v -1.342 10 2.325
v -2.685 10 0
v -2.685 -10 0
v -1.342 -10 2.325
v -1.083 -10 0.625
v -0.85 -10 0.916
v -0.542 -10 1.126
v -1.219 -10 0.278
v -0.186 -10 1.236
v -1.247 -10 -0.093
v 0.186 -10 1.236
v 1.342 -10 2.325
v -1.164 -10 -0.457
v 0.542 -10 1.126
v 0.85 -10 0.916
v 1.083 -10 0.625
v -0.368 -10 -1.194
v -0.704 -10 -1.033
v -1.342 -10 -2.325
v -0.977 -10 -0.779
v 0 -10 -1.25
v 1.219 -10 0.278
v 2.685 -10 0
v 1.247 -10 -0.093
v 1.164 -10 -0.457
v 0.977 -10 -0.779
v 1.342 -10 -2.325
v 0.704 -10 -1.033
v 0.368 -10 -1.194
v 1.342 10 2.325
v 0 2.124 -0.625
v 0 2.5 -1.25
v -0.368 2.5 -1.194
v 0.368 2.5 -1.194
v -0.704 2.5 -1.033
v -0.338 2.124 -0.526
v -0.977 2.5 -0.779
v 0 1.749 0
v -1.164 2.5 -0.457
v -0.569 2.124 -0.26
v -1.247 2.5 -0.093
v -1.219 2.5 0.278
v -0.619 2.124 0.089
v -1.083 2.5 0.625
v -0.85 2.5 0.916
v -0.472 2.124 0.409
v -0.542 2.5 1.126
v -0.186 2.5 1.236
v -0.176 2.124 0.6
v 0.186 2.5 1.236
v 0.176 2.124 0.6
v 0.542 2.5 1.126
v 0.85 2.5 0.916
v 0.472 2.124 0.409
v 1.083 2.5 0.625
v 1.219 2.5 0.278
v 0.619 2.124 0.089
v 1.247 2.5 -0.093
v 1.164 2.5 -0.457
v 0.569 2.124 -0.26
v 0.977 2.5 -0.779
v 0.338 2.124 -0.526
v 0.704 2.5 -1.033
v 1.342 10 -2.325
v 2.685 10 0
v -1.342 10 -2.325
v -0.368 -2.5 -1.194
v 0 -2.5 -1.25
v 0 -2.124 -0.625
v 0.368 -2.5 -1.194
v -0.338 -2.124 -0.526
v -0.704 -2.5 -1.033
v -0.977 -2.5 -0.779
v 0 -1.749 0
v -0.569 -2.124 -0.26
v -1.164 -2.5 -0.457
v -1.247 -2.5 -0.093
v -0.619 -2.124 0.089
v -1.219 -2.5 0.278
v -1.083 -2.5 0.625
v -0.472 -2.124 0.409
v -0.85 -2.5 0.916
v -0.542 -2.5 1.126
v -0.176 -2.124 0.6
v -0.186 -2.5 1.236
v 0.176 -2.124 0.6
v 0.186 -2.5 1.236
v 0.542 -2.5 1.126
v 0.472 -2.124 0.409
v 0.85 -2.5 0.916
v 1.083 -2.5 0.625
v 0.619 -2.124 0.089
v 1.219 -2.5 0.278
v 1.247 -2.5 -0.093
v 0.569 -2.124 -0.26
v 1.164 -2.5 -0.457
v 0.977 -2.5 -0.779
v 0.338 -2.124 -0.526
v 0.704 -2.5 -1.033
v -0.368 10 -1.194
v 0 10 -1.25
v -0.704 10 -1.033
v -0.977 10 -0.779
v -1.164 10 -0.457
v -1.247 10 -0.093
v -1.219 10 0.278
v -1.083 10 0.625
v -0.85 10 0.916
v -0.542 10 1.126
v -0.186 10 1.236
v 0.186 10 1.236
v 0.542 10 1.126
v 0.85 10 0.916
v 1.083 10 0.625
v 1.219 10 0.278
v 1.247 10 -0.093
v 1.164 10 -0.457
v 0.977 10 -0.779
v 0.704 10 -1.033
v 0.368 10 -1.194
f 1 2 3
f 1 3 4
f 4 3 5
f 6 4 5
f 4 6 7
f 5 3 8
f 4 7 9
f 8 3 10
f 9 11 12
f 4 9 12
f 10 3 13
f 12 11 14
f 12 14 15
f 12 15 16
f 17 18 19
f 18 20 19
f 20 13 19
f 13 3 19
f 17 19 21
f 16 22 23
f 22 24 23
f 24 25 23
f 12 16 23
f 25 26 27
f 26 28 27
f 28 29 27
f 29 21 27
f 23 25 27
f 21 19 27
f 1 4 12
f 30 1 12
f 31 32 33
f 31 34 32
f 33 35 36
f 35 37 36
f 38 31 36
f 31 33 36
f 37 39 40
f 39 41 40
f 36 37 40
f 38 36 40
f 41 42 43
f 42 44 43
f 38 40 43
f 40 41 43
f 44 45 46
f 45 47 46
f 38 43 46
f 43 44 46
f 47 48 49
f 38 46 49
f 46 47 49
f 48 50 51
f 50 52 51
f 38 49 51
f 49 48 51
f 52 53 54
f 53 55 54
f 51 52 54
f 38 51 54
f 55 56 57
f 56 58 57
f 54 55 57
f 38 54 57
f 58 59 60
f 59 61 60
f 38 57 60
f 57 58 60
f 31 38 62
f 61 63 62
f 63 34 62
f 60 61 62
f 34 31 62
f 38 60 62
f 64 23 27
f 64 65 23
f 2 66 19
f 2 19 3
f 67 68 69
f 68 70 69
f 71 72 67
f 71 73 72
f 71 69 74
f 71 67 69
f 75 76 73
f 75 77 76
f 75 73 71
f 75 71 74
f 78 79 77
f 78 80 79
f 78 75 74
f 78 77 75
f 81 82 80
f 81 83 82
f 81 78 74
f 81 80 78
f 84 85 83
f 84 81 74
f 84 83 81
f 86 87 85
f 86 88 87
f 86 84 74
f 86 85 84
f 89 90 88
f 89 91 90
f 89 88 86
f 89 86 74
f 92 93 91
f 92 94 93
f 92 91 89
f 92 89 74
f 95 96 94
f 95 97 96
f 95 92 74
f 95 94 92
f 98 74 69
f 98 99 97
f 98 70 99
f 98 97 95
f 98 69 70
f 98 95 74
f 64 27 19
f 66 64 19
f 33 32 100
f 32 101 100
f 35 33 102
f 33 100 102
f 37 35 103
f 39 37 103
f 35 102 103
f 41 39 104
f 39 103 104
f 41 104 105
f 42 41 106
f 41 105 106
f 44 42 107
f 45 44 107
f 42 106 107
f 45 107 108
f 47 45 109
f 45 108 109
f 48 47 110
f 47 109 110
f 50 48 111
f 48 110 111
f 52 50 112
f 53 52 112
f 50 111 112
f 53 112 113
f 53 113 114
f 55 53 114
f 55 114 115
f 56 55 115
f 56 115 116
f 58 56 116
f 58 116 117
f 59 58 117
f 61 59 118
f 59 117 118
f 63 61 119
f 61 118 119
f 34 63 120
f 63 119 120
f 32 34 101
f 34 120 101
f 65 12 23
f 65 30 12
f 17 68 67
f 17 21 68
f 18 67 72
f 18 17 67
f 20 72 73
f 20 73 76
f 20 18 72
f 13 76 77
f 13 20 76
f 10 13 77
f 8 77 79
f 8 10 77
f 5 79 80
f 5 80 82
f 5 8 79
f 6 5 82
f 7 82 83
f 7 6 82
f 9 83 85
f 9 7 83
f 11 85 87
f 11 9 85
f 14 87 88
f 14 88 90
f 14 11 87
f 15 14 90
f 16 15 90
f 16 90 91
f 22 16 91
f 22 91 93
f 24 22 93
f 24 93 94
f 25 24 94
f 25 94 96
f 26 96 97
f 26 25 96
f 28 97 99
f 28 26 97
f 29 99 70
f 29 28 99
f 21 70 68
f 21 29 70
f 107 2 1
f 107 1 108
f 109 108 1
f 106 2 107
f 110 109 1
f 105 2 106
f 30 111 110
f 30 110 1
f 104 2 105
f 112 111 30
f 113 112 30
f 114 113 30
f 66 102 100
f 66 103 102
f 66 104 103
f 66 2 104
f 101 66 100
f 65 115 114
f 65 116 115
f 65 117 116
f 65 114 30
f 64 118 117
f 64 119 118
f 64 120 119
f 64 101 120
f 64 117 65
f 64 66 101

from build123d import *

# Parameters (mm, degrees)
EXTRUDE_1_DEPTH = 10


with BuildPart() as part:
    # 草图1 → 凸台-拉伸1 (new, symmetric)
    with BuildSketch(Plane(origin=(0, 0, 0), x_dir=(1, 0, 0), z_dir=(0, 1, 0))):
        Polygon((2.684678752, 0), (1.342339376, 2.325), (-1.342339376, 2.325), (-2.684678752, 0), (-1.342339376, -2.325), (1.342339376, -2.325), align=None)
    extrude(amount=EXTRUDE_1_DEPTH, both=True)

    # 草图2 → M3 螺纹孔1 (revolve, cut)
    with BuildSketch(Plane(origin=(0, -10, 0), x_dir=(0, 0, -1), z_dir=(1, 0, 0))):
        Polygon((0, 0), (0, 8.251075774), (1.25, 7.5), (1.25, 0), align=None)
    hole_wizard_m3_1 = revolve(axis=Axis((0, -16.35, 0), (0, 1, 0)), mode=Mode.SUBTRACT)

    # 镜向1: M3 螺纹孔1 across plane
    add(hole_wizard_m3_1.mirror(Plane.ZX), mode=Mode.SUBTRACT)


solid = part.part
